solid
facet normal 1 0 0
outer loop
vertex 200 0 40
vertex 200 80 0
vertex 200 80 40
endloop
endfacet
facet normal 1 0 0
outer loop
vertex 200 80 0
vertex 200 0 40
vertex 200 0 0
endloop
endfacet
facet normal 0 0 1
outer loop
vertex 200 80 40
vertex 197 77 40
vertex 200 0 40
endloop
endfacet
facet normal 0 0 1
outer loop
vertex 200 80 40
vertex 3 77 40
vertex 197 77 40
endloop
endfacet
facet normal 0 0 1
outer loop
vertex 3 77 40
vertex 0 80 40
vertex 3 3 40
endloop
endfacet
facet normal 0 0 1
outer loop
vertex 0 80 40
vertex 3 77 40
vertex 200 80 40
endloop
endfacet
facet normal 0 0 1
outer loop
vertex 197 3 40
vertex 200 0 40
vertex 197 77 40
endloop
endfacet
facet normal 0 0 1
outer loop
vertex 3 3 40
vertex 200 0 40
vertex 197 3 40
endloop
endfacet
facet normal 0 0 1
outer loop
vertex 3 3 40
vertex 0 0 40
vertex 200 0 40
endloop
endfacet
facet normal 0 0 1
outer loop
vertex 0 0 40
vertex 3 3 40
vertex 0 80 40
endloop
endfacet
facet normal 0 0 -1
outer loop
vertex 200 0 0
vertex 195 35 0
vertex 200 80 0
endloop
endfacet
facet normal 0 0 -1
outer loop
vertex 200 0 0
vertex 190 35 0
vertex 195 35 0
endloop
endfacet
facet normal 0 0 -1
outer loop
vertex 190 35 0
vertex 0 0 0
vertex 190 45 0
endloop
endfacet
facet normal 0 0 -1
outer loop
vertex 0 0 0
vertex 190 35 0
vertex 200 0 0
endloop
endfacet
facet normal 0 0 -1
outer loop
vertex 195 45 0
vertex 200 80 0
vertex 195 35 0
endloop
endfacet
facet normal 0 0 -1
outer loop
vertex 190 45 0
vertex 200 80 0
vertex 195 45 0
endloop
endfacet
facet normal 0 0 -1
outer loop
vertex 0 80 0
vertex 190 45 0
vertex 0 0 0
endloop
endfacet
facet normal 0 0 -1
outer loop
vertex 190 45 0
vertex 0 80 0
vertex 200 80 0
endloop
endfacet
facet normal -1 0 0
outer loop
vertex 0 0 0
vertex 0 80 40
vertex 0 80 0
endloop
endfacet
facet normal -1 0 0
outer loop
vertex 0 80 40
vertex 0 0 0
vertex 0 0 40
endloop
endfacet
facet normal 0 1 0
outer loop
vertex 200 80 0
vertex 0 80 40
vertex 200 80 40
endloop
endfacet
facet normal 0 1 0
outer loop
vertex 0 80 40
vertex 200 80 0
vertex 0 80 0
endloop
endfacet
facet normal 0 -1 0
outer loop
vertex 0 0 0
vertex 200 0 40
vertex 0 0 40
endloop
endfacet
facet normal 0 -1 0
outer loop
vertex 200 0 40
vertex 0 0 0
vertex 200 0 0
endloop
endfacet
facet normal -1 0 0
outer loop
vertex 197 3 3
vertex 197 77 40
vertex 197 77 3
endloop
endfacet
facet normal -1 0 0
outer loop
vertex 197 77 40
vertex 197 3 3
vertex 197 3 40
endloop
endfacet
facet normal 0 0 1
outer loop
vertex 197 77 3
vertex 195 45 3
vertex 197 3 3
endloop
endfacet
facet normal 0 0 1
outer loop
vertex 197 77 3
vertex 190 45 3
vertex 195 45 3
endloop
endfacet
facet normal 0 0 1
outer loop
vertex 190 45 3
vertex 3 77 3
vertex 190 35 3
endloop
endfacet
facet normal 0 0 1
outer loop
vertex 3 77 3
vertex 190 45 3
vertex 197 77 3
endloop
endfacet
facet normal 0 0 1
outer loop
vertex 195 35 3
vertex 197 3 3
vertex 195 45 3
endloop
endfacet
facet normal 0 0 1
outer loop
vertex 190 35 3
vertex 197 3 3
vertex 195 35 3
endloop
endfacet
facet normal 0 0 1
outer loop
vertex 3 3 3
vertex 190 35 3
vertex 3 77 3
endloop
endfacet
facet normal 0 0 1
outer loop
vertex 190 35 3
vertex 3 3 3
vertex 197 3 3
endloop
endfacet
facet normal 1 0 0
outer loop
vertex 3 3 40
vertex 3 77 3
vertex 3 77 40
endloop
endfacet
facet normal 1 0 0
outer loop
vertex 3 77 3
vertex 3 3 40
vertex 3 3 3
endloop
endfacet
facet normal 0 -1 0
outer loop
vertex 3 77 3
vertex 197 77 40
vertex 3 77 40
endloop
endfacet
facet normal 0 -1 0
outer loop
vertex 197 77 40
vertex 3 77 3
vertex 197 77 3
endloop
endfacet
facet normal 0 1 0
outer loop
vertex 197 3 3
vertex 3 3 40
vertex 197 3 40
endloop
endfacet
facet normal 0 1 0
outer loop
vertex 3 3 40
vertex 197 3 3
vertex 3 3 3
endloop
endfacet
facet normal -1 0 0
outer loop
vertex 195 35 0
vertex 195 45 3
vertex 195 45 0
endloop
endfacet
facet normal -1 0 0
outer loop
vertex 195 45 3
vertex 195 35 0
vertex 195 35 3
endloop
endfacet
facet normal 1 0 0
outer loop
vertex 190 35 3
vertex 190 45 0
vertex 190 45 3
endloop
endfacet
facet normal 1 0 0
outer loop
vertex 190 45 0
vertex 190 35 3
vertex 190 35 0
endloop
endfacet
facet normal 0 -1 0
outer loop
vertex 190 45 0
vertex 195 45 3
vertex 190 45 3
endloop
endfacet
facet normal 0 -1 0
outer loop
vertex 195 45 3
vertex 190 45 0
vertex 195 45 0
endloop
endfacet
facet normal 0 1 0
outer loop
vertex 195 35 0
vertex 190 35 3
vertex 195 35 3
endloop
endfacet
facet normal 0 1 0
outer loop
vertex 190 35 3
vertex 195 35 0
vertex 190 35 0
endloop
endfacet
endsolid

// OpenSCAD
$fn=100;
length = 200; width = 80; height = 40; wall = 3;

difference() {
    cube([length, width, height]);
    translate([wall, wall, wall])
        cube([length - 2*wall, width - 2*wall, height]);
    translate([20, 20, height - 10])
        cylinder(h=10, r=2.5);
    translate([20, width - 20, height - 10])
        cylinder(h=10, r=2.5);
    translate([length - 10, width/2 - 5, 0])
        cube([5, 10, 15]);
}
